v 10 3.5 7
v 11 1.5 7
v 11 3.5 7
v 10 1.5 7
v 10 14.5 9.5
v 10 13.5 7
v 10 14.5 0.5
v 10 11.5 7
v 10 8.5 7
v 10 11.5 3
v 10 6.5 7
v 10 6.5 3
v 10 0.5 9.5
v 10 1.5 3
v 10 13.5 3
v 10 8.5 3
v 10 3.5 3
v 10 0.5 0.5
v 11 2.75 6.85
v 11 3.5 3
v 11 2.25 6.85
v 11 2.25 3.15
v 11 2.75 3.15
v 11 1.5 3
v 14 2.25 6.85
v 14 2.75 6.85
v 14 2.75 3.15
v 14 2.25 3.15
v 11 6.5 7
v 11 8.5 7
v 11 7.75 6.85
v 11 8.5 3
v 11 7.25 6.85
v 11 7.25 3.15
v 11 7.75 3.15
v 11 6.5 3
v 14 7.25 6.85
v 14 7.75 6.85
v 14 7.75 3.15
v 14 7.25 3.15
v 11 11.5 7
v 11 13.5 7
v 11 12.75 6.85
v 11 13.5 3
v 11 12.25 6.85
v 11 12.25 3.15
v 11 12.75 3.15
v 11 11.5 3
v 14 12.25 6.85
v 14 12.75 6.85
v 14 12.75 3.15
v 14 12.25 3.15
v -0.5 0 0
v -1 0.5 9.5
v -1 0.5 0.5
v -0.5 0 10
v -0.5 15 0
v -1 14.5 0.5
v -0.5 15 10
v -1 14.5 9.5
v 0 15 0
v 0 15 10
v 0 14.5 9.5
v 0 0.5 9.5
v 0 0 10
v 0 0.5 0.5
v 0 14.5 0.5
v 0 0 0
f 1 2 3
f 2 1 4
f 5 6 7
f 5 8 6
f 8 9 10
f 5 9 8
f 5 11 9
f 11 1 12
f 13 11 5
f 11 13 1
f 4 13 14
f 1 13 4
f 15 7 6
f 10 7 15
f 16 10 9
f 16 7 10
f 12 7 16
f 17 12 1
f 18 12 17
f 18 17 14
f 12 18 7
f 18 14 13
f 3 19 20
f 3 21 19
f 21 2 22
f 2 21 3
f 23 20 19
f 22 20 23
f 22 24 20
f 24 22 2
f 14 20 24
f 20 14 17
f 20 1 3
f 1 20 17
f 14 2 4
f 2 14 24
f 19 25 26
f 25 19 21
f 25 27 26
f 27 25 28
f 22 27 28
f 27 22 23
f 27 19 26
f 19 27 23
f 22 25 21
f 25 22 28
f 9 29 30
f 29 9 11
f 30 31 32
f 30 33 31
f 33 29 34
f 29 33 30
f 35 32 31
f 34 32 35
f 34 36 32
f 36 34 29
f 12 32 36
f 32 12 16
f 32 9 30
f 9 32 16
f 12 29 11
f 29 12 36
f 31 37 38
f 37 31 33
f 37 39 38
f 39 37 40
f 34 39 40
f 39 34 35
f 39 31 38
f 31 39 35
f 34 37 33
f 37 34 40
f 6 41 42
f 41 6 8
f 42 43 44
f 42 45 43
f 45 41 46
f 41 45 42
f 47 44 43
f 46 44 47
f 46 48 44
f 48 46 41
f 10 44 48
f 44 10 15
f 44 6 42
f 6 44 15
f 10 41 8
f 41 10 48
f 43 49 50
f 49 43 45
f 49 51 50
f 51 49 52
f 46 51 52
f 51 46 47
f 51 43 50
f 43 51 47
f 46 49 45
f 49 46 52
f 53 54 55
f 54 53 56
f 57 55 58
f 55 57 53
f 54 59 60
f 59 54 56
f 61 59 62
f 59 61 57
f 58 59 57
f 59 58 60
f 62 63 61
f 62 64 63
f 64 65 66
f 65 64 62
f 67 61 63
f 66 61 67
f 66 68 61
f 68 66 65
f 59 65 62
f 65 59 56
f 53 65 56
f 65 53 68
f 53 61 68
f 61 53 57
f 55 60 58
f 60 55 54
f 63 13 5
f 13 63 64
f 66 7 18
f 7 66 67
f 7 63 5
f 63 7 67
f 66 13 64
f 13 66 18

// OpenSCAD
// harsh approximation of KCD1-11 switch

front_panel_width = 15;
front_panel_height = 10;

// function for the sake of export
function get_switch_body_dimensions() = [10, 14, 9];

switch_body_dimensions = get_switch_body_dimensions();

module switch(body_offset = 0) {
  body_depth = switch_body_dimensions.x;
  color("#1b1b1be8") {
    translate([body_depth / 2, front_panel_width / 2, front_panel_height / 2]) {
      rotate([0, -90, 0]) {
        // front panel
        translate([0, 0, body_depth / 2 + 0.25]) {
          hull() {
            translate([0, 0, 0.25]) {
              cube([front_panel_height - 1, front_panel_width - 1, 1], center=true);
            }
            cube([front_panel_height, front_panel_width, 0.5], center=true);
          }
        }

        // main body
        cube([switch_body_dimensions.z + body_offset, switch_body_dimensions.y + body_offset, body_depth], center=true);

        // pins
        for (i = [-1:1]) {
          translate([0, 5 * i, -5.5]) {
            cube([4, 2, 1], center=true);
            translate([0, 0, -2]) {
              cube([3.7, 0.5, 3], center=true);
            }
          }
        }
      }
    }
  }
}

switch();
